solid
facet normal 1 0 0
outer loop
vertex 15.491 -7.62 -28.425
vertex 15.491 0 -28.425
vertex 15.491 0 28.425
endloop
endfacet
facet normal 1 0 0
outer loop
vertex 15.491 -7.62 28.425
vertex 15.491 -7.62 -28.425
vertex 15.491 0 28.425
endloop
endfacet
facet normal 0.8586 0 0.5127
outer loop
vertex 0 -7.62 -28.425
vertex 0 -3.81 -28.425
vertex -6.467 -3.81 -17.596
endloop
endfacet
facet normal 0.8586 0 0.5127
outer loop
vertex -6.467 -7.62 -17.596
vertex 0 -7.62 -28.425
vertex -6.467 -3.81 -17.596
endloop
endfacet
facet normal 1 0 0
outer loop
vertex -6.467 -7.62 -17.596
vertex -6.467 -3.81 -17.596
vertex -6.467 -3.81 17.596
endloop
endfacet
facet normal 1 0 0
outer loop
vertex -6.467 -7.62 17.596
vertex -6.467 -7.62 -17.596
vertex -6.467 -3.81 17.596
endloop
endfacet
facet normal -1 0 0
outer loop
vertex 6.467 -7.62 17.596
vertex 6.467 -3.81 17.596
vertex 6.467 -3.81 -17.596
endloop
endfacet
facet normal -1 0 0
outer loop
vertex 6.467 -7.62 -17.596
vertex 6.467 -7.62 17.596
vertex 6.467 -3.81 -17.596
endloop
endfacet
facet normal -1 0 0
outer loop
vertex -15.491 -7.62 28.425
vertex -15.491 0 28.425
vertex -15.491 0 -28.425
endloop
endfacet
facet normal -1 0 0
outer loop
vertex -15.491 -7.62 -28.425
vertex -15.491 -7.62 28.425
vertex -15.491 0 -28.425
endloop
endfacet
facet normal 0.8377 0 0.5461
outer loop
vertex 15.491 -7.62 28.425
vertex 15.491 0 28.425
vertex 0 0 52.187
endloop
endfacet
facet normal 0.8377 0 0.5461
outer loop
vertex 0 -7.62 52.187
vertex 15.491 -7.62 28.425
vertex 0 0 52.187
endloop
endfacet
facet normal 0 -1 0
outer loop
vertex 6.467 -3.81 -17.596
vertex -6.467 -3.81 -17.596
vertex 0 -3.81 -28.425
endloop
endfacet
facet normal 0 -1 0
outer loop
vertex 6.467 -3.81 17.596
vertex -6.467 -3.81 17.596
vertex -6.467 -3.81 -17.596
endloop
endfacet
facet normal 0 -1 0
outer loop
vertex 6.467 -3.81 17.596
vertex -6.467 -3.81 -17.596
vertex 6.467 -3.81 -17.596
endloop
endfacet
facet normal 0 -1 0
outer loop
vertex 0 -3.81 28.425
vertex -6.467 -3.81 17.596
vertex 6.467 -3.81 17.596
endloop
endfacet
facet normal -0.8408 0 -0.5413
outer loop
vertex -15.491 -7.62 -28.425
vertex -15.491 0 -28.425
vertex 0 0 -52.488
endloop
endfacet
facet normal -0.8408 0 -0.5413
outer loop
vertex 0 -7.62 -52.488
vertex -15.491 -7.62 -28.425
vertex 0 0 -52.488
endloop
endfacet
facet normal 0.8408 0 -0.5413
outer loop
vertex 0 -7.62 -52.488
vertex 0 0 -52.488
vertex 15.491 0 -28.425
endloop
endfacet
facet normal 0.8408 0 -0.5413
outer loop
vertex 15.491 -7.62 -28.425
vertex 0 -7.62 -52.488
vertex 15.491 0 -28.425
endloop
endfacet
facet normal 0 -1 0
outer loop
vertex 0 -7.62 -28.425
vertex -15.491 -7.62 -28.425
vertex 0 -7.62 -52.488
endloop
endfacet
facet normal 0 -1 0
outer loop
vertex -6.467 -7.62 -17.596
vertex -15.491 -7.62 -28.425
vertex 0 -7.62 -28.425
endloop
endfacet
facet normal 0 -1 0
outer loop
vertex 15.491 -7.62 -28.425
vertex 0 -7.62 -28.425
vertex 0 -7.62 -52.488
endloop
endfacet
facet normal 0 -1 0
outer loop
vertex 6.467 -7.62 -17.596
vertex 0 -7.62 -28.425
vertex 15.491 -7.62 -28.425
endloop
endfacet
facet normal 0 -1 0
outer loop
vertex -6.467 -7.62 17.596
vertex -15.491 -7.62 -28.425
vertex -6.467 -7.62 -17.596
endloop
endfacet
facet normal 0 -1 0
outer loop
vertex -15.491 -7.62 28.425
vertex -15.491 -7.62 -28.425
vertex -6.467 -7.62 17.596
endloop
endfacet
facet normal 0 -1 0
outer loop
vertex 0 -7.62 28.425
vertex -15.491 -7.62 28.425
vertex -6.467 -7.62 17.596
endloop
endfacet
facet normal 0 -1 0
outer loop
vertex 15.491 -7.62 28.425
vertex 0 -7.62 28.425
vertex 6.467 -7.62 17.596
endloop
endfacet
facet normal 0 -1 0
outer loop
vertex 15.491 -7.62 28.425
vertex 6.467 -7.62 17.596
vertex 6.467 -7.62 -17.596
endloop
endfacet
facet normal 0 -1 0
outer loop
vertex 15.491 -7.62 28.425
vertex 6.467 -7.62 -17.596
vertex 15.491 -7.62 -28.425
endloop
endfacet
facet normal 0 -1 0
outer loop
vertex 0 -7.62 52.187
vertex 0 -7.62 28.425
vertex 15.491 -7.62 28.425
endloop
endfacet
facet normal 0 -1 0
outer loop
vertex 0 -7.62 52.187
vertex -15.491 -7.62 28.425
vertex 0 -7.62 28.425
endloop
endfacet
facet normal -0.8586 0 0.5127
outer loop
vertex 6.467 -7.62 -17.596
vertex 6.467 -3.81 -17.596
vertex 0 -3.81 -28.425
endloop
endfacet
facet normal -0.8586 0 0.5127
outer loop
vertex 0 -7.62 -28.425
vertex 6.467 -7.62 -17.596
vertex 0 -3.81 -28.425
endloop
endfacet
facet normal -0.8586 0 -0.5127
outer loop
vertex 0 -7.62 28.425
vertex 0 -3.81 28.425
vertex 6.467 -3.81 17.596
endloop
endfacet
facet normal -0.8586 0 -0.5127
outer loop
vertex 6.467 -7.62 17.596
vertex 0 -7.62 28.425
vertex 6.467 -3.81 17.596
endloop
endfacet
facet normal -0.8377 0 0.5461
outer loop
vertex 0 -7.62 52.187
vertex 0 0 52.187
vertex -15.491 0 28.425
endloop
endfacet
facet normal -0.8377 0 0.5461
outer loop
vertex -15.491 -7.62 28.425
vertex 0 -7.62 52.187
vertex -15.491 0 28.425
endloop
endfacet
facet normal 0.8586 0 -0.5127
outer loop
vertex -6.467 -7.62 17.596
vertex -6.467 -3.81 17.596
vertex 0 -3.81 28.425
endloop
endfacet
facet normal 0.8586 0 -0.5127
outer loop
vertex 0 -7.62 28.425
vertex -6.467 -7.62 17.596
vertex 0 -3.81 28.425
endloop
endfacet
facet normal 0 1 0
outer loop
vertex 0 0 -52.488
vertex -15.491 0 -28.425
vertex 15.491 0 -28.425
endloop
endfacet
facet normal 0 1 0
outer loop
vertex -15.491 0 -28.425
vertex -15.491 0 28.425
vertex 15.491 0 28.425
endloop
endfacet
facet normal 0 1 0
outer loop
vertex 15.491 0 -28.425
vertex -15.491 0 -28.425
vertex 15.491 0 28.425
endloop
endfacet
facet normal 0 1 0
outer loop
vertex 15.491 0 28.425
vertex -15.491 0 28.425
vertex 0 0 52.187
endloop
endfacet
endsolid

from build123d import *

# Parameters (mm, degrees)
F1_DEPTH = 7.62
F2_DEPTH = 3.81


with BuildPart() as f1:
    # F0 (on Front) → F1 (new body)
    with BuildSketch(Plane.XZ):
        Polygon((0, 52.186977), (-15.490659, 28.424604), (-15.490659, -28.424604), (0, -52.487765), (15.490659, -28.424604), (15.490659, 28.424604), align=None)
        Polygon((-6.466974, -17.596183), (-6.466974, 17.596183), (0, 28.424604), (6.466974, 17.596183), (6.466974, -17.596183), (0, -28.424604), align=None, mode=Mode.SUBTRACT)
    extrude(amount=F1_DEPTH)

    # F0 (on Front) → F2 (join)
    with BuildSketch(Plane.XZ):
        Polygon((0, 28.424604), (-6.466974, 17.596183), (-6.466974, -17.596183), (0, -28.424604), (6.466974, -17.596183), (6.466974, 17.596183), align=None)
    extrude(amount=F2_DEPTH)


solid = f1.part
